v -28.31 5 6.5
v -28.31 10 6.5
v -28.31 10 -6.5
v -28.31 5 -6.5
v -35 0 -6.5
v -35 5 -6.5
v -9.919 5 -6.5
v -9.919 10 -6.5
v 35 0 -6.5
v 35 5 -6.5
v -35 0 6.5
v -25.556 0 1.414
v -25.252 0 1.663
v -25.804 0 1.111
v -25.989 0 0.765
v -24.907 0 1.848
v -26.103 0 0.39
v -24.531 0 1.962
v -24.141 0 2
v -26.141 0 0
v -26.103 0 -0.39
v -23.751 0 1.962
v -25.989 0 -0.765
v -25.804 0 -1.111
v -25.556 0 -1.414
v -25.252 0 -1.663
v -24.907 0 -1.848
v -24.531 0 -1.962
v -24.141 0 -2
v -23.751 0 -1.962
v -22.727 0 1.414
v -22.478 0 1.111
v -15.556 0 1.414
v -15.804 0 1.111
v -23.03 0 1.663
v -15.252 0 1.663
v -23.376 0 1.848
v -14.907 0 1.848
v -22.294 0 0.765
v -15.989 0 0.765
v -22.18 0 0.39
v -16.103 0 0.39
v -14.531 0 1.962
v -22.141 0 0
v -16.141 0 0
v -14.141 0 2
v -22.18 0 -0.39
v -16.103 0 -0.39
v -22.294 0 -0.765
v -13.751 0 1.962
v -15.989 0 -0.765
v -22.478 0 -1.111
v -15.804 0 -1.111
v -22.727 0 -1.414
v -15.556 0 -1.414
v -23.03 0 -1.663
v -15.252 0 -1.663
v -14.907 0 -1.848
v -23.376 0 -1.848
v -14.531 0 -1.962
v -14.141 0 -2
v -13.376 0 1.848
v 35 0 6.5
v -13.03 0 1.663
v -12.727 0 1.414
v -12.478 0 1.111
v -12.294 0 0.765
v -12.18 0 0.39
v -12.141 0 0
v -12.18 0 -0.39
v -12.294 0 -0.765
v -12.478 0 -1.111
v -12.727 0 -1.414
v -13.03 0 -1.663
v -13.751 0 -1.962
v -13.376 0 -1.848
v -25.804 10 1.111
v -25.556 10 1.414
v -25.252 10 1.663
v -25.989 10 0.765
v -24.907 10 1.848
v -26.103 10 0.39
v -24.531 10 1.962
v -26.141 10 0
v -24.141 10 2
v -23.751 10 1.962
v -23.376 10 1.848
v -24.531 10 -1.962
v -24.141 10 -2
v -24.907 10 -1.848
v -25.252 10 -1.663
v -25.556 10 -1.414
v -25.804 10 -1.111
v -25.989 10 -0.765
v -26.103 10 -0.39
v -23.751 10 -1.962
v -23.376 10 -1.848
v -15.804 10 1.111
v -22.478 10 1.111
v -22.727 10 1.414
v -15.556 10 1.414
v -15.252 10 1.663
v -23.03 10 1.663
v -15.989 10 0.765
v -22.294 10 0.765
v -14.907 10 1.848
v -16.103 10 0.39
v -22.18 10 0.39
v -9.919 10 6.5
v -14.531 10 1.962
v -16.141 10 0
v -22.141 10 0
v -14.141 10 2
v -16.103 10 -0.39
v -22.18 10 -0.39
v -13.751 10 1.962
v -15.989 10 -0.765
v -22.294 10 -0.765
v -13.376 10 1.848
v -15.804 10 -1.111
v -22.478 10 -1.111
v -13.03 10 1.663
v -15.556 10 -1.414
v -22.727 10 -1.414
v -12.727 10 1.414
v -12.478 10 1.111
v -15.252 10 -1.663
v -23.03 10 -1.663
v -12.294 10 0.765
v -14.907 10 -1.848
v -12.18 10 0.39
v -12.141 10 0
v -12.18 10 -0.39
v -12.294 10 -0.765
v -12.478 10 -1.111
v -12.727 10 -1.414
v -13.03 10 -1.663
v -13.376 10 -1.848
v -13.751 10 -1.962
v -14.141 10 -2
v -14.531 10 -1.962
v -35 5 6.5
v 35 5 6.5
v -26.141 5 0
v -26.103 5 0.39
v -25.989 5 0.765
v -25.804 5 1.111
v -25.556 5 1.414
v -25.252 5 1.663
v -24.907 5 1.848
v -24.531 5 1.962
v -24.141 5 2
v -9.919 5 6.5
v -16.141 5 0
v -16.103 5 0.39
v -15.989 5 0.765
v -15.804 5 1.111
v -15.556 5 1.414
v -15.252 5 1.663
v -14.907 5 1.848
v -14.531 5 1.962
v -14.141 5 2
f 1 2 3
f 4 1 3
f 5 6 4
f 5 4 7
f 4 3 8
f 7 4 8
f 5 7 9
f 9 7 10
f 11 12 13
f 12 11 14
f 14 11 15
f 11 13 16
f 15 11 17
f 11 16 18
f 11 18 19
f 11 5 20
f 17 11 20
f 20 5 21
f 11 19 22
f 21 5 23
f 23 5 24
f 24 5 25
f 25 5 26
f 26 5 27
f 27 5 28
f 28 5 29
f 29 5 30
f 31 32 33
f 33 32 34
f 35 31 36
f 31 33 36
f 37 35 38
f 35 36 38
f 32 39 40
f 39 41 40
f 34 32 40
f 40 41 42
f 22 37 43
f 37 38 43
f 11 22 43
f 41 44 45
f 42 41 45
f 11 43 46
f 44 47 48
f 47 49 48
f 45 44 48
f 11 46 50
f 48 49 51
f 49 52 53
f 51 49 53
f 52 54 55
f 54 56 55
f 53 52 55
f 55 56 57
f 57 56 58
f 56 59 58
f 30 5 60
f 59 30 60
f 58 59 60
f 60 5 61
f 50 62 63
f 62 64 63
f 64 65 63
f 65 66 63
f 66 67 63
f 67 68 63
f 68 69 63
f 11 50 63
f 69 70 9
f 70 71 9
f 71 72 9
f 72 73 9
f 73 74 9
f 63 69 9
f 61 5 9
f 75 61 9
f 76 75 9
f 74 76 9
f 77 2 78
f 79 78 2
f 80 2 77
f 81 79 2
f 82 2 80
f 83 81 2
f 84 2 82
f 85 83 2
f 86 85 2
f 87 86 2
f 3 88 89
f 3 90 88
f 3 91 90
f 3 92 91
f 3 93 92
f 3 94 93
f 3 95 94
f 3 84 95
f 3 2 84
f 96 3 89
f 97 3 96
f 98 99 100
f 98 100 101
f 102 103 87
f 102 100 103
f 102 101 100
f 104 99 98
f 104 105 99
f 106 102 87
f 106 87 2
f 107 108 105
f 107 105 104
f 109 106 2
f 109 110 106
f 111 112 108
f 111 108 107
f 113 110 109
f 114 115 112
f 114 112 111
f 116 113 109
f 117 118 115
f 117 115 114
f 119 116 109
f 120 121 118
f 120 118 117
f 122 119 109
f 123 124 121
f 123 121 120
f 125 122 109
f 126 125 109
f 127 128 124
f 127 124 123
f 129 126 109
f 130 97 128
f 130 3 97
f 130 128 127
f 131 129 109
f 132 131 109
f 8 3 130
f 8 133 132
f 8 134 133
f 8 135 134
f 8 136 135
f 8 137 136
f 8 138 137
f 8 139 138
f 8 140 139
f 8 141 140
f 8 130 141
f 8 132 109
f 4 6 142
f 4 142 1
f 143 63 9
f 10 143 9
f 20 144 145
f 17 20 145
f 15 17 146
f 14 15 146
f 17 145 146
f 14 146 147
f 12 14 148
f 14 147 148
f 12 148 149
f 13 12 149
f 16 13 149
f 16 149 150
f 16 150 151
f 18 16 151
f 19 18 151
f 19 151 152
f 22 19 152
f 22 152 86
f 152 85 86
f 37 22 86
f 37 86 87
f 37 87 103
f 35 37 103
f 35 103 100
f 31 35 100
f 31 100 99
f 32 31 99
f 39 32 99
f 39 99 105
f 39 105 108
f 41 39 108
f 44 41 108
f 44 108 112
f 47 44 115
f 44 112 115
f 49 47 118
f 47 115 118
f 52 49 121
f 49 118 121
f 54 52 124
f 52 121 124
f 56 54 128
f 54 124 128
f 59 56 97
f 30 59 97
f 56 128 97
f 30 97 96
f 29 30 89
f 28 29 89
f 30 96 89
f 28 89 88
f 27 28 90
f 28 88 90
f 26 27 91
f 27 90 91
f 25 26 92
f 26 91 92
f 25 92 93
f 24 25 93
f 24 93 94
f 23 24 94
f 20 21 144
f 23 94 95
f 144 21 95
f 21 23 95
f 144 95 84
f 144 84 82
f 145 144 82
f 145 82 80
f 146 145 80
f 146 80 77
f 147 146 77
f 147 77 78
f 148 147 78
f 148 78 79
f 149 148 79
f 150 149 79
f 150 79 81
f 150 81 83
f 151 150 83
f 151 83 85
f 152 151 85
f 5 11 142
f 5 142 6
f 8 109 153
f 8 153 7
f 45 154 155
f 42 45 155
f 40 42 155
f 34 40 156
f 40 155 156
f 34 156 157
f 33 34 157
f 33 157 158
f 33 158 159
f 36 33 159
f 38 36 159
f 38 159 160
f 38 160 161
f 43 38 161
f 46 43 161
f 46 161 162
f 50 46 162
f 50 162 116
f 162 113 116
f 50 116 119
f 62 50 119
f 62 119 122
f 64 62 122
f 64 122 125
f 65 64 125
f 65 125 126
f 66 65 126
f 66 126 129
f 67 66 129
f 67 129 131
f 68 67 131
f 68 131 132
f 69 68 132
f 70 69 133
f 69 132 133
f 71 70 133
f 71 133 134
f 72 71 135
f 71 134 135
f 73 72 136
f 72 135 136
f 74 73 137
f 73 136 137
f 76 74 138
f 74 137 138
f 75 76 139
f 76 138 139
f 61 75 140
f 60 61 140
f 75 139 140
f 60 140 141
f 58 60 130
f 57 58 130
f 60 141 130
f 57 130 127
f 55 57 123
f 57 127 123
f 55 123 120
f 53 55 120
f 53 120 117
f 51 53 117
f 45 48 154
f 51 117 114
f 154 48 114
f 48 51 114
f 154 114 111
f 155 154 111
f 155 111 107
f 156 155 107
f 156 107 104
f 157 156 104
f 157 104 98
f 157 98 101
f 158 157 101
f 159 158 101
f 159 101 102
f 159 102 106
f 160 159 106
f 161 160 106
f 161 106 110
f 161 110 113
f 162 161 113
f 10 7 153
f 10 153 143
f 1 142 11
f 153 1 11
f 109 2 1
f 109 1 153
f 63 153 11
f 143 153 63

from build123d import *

# Parameters (mm, degrees)
SKETCH1_W           = 70
SKETCH1_H           = 13
BOSS_EXTRUDE1_DEPTH = 5
SKETCH2_R           = 2
CUT_EXTRUDE1_DEPTH  = 36.947878936
BOSS_EXTRUDE3_START = 5
SKETCH2_3_W         = 18.390349325
SKETCH2_3_H         = 13
SKETCH2_3_R         = 2
BOSS_EXTRUDE3_DEPTH = 5


with BuildPart() as part:
    # Sketch1 → Boss-Extrude1 (new body)
    with BuildSketch(Plane(origin=(0, 0, 0), x_dir=(1, 0, 0), z_dir=(0, 1, 0))):
        Rectangle(SKETCH1_W, SKETCH1_H)
    extrude(amount=BOSS_EXTRUDE1_DEPTH)

    # Sketch2 → Cut-Extrude1 (cut, through all)
    with BuildSketch(Plane(origin=(0, 5, 0), x_dir=(1, 0, 0), z_dir=(0, 1, 0))):
        with Locations((-24.141309667, 0)):
            Circle(SKETCH2_R)
        with Locations((-14.141309667, 0)):
            Circle(SKETCH2_R)
    extrude(amount=-CUT_EXTRUDE1_DEPTH, mode=Mode.SUBTRACT)

    # Sketch2<3> → Boss-Extrude3 (add)
    with BuildSketch(Plane(origin=(0, 5, 0), x_dir=(1, 0, 0), z_dir=(0, 1, 0)).offset(BOSS_EXTRUDE3_START)):
        with Locations((-19.114378827, 0)):
            Rectangle(SKETCH2_3_W, SKETCH2_3_H)
        with Locations((-24.141309667, 0)):
            Circle(SKETCH2_3_R, mode=Mode.SUBTRACT)
        with Locations((-14.141309667, 0)):
            Circle(SKETCH2_3_R, mode=Mode.SUBTRACT)
    extrude(amount=-BOSS_EXTRUDE3_DEPTH)


solid = part.part
